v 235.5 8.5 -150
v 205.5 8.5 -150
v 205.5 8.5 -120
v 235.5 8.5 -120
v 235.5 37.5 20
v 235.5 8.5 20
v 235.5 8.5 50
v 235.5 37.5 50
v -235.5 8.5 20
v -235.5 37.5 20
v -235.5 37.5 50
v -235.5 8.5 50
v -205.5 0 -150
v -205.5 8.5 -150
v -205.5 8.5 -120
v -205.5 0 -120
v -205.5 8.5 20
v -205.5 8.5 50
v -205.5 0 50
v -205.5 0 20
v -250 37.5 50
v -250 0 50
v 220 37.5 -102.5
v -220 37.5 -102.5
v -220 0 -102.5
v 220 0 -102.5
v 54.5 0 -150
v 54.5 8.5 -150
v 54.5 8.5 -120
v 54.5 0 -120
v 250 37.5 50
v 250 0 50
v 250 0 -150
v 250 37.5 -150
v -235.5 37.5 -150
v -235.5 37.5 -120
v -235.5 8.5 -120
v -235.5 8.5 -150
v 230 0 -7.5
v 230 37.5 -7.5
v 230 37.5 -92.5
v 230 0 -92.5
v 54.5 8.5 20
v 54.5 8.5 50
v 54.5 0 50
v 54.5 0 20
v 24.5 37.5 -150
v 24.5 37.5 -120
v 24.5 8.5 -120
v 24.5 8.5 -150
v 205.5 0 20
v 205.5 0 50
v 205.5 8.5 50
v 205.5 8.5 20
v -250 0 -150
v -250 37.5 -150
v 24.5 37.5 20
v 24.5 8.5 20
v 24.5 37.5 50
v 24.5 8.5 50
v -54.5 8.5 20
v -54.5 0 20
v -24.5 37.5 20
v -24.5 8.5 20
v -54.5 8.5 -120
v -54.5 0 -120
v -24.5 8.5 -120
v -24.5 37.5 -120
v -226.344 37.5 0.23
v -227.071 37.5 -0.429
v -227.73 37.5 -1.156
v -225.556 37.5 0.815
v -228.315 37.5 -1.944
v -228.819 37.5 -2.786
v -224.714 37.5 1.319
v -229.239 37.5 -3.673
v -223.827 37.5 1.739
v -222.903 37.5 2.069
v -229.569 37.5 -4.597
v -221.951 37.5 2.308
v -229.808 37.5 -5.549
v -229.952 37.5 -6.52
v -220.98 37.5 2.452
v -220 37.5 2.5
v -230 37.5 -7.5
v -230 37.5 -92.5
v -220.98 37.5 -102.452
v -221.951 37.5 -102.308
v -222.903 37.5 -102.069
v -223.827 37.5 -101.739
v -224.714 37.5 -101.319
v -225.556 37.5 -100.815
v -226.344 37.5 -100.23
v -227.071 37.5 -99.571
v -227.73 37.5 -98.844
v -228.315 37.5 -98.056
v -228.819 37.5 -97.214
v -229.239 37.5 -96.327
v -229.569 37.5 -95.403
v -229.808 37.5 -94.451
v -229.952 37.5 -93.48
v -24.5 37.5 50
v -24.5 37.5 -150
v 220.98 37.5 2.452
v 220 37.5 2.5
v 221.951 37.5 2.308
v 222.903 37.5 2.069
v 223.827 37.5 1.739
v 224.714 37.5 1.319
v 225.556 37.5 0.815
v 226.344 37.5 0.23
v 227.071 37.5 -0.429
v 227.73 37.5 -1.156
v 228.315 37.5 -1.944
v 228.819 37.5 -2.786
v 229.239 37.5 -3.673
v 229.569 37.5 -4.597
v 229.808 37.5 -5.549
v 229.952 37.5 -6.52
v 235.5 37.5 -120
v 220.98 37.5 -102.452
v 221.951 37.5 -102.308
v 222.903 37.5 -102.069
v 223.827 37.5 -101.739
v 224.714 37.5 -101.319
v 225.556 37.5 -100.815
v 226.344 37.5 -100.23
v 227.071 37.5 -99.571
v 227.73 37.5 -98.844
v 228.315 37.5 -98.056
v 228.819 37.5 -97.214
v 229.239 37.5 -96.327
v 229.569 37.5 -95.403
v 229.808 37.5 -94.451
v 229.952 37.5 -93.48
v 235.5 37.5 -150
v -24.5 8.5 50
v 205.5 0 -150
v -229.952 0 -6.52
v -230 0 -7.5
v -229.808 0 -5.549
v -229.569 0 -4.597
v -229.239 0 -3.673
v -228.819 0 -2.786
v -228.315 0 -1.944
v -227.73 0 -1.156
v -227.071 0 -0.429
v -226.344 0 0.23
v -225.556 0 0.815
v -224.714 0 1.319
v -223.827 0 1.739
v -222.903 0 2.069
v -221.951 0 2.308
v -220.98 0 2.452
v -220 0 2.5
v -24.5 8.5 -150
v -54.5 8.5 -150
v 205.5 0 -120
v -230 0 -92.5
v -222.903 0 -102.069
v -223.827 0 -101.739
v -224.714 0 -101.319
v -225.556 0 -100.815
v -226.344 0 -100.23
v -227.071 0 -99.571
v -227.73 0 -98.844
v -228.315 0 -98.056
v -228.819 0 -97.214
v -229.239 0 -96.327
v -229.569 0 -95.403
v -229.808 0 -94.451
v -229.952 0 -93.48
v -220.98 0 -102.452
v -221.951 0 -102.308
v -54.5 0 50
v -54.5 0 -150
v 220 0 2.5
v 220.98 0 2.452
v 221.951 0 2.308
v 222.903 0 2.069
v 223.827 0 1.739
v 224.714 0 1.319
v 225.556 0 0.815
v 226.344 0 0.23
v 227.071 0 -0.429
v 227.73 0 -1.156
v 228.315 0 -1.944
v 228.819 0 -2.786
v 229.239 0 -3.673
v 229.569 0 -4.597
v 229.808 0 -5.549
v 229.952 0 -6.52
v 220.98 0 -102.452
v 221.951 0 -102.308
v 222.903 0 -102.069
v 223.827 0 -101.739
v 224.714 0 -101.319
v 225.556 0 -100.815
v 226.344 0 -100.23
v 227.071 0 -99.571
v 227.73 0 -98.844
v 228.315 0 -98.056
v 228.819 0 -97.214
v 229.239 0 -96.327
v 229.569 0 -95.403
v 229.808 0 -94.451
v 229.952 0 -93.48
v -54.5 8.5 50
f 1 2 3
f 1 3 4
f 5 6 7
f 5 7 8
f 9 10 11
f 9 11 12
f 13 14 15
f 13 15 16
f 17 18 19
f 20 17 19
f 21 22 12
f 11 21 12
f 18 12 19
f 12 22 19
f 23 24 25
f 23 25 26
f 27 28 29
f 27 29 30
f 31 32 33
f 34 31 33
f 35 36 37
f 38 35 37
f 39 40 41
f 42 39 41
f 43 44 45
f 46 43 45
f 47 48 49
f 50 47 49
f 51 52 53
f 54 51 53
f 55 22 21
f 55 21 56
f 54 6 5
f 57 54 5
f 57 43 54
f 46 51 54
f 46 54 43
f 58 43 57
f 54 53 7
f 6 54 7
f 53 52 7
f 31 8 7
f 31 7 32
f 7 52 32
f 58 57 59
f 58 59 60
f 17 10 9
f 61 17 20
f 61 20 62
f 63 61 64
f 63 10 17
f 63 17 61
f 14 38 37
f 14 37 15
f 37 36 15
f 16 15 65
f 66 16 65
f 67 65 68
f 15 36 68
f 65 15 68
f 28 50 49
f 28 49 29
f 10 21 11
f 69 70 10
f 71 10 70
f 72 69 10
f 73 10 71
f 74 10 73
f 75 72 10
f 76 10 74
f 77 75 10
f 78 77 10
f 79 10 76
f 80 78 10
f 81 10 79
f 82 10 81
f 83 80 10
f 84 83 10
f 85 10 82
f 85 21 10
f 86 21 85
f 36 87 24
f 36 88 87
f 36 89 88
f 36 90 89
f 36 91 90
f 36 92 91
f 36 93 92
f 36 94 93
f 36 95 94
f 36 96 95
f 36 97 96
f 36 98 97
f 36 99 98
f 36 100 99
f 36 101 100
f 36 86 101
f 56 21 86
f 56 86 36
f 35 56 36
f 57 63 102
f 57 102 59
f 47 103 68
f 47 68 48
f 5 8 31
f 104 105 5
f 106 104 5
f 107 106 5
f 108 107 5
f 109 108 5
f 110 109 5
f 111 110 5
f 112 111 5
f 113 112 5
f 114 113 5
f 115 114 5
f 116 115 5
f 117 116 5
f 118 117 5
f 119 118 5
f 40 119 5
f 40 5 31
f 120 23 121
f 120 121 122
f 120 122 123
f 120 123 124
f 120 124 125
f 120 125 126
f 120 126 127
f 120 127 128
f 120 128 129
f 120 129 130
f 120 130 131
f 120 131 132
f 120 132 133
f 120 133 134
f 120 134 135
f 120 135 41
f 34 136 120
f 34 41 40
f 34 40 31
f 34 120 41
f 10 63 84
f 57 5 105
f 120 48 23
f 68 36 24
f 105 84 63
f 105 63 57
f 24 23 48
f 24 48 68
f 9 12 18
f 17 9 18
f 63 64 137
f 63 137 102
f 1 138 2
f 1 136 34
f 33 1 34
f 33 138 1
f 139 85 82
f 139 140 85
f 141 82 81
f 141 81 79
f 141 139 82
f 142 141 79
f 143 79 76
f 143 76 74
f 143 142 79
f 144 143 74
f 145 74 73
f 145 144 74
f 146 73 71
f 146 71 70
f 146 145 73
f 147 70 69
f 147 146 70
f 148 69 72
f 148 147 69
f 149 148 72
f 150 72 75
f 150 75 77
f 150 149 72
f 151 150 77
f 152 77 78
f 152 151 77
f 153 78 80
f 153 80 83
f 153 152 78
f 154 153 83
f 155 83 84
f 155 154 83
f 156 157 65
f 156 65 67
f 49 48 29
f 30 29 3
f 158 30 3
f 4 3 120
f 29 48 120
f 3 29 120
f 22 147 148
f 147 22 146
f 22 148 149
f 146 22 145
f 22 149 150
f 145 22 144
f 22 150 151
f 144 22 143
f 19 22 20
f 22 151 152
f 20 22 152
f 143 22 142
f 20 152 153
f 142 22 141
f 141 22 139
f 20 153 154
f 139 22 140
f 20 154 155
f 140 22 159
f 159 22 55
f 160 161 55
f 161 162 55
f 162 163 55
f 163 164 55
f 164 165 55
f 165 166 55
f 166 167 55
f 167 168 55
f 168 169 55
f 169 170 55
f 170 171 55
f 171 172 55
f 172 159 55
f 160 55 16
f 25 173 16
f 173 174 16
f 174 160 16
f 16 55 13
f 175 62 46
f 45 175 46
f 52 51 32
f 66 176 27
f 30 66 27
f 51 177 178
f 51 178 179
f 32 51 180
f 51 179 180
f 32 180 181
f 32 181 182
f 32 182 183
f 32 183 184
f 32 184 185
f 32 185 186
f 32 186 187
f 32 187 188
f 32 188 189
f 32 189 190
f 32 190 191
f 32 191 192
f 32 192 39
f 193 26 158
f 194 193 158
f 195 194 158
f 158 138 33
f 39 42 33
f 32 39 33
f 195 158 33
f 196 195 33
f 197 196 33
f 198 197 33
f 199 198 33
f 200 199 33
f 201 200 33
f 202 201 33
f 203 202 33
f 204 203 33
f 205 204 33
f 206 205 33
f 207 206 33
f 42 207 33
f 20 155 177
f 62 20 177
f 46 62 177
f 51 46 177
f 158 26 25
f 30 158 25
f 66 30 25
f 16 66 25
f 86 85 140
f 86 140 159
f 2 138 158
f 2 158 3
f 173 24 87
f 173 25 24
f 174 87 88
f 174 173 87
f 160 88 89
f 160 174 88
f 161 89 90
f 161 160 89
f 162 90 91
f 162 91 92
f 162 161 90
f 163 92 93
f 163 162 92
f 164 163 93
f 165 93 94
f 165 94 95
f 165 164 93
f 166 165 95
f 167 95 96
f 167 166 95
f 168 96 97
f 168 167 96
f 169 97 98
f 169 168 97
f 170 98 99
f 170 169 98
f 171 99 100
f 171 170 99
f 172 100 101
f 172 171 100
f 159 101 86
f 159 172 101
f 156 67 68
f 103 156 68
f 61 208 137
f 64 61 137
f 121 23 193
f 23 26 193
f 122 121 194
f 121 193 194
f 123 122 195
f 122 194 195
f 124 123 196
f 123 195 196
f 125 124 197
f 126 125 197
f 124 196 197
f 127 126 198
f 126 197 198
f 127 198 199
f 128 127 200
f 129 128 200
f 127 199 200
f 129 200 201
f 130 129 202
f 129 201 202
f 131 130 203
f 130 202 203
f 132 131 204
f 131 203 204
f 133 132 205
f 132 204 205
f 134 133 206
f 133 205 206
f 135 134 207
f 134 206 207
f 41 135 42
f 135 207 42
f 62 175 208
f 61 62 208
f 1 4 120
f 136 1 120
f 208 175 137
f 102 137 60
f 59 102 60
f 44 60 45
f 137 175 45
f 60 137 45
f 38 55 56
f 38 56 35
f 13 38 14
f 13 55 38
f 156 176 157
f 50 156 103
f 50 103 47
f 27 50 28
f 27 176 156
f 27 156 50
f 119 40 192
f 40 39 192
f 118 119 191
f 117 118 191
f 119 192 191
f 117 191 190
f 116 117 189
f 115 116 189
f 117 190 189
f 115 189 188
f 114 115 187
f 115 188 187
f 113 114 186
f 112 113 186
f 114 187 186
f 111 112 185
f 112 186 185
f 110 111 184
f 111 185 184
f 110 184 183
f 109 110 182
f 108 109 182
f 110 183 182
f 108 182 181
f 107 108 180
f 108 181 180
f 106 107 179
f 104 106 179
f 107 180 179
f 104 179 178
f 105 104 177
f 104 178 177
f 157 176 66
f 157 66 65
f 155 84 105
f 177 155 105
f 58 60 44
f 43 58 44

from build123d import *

# Parameters (mm, degrees)
SKETCH2_W            = 500
SKETCH2_H            = 200
BOSS_EXTRUDE1_DEPTH  = 37.5
CUT_EXTRUDE3_DEPTH   = 30
LPATTERN1_COUNT      = 2
LPATTERN1_PITCH      = 260
MIRROR1_COPY_1_DEPTH = 30
SKETCH7_W            = 460
SKETCH7_H            = 105
CUT_EXTRUDE4_DEPTH   = 160
FILLET1_R            = 10
FILLET2_R            = 10
FILLET3_R            = 10
FILLET4_R            = 10


with BuildPart() as part:
    # Sketch2 → Boss-Extrude1 (new body)
    with BuildSketch(Plane(origin=(0, 0, 0), x_dir=(1, 0, 0), z_dir=(0, 1, 0))):
        with Locations((0, 50)):
            Rectangle(SKETCH2_W, SKETCH2_H)
    extrude(amount=BOSS_EXTRUDE1_DEPTH)

    # Sketch5 → Cut-Extrude3 (cut)
    with BuildSketch(Plane(origin=(0, 0, -150), x_dir=(-1, 0, 0), z_dir=(0, 0, -1))):
        Polygon((24.5, 66.5), (54.5, 66.5), (54.5, 75), (205.5, 75), (205.5, 66.5), (235.5, 66.5), (235.5, 8.5), (205.5, 8.5), (205.5, 0), (54.5, 0), (54.5, 8.5), (24.5, 8.5), align=None)
    cut_extrude3 = extrude(amount=-CUT_EXTRUDE3_DEPTH, mode=Mode.SUBTRACT)

    # LPattern1: Cut-Extrude3 ×2
    with Locations(*[(i * LPATTERN1_PITCH, 0, 0) for i in range(1, LPATTERN1_COUNT)]):
        add(cut_extrude3, mode=Mode.SUBTRACT)

    # Mirror1: Cut-Extrude3 across plane
    add(cut_extrude3.mirror(Plane.XY.offset(-50)), mode=Mode.SUBTRACT)

    # Mirror1 copy 1 sketch → Mirror1 copy 1 (cut)
    with BuildSketch(Plane(origin=(260, 0, 50), x_dir=(-1, 0, 0), z_dir=(0, 0, 1))):
        Polygon((24.5, -66.5), (54.5, -66.5), (54.5, -75), (205.5, -75), (205.5, -66.5), (235.5, -66.5), (235.5, -8.5), (205.5, -8.5), (205.5, 0), (54.5, 0), (54.5, -8.5), (24.5, -8.5), align=None)
    extrude(amount=-MIRROR1_COPY_1_DEPTH, mode=Mode.SUBTRACT)

    # Sketch7 → Cut-Extrude4 (cut)
    with BuildSketch(Plane(origin=(0, 37.5, 0), x_dir=(1, 0, 0), z_dir=(0, 1, 0))):
        with Locations((0, 50)):
            Rectangle(SKETCH7_W, SKETCH7_H)
    extrude(amount=-CUT_EXTRUDE4_DEPTH, mode=Mode.SUBTRACT)

    # Fillet1
    fillet1_edges = [part.edges().sort_by_distance(p)[0] for p in [
        (-230, 18.75, -102.5),
    ]]
    fillet(fillet1_edges, radius=FILLET1_R)

    # Fillet2
    fillet2_edges = [part.edges().sort_by_distance(p)[0] for p in [
        (-230, 18.75, 2.5),
    ]]
    fillet(fillet2_edges, radius=FILLET2_R)

    # Fillet3
    fillet3_edges = [part.edges().sort_by_distance(p)[0] for p in [
        (230, 18.75, -102.5),
    ]]
    fillet(fillet3_edges, radius=FILLET3_R)

    # Fillet4
    fillet4_edges = [part.edges().sort_by_distance(p)[0] for p in [
        (230, 18.75, 2.5),
    ]]
    fillet(fillet4_edges, radius=FILLET4_R)


solid = part.part
